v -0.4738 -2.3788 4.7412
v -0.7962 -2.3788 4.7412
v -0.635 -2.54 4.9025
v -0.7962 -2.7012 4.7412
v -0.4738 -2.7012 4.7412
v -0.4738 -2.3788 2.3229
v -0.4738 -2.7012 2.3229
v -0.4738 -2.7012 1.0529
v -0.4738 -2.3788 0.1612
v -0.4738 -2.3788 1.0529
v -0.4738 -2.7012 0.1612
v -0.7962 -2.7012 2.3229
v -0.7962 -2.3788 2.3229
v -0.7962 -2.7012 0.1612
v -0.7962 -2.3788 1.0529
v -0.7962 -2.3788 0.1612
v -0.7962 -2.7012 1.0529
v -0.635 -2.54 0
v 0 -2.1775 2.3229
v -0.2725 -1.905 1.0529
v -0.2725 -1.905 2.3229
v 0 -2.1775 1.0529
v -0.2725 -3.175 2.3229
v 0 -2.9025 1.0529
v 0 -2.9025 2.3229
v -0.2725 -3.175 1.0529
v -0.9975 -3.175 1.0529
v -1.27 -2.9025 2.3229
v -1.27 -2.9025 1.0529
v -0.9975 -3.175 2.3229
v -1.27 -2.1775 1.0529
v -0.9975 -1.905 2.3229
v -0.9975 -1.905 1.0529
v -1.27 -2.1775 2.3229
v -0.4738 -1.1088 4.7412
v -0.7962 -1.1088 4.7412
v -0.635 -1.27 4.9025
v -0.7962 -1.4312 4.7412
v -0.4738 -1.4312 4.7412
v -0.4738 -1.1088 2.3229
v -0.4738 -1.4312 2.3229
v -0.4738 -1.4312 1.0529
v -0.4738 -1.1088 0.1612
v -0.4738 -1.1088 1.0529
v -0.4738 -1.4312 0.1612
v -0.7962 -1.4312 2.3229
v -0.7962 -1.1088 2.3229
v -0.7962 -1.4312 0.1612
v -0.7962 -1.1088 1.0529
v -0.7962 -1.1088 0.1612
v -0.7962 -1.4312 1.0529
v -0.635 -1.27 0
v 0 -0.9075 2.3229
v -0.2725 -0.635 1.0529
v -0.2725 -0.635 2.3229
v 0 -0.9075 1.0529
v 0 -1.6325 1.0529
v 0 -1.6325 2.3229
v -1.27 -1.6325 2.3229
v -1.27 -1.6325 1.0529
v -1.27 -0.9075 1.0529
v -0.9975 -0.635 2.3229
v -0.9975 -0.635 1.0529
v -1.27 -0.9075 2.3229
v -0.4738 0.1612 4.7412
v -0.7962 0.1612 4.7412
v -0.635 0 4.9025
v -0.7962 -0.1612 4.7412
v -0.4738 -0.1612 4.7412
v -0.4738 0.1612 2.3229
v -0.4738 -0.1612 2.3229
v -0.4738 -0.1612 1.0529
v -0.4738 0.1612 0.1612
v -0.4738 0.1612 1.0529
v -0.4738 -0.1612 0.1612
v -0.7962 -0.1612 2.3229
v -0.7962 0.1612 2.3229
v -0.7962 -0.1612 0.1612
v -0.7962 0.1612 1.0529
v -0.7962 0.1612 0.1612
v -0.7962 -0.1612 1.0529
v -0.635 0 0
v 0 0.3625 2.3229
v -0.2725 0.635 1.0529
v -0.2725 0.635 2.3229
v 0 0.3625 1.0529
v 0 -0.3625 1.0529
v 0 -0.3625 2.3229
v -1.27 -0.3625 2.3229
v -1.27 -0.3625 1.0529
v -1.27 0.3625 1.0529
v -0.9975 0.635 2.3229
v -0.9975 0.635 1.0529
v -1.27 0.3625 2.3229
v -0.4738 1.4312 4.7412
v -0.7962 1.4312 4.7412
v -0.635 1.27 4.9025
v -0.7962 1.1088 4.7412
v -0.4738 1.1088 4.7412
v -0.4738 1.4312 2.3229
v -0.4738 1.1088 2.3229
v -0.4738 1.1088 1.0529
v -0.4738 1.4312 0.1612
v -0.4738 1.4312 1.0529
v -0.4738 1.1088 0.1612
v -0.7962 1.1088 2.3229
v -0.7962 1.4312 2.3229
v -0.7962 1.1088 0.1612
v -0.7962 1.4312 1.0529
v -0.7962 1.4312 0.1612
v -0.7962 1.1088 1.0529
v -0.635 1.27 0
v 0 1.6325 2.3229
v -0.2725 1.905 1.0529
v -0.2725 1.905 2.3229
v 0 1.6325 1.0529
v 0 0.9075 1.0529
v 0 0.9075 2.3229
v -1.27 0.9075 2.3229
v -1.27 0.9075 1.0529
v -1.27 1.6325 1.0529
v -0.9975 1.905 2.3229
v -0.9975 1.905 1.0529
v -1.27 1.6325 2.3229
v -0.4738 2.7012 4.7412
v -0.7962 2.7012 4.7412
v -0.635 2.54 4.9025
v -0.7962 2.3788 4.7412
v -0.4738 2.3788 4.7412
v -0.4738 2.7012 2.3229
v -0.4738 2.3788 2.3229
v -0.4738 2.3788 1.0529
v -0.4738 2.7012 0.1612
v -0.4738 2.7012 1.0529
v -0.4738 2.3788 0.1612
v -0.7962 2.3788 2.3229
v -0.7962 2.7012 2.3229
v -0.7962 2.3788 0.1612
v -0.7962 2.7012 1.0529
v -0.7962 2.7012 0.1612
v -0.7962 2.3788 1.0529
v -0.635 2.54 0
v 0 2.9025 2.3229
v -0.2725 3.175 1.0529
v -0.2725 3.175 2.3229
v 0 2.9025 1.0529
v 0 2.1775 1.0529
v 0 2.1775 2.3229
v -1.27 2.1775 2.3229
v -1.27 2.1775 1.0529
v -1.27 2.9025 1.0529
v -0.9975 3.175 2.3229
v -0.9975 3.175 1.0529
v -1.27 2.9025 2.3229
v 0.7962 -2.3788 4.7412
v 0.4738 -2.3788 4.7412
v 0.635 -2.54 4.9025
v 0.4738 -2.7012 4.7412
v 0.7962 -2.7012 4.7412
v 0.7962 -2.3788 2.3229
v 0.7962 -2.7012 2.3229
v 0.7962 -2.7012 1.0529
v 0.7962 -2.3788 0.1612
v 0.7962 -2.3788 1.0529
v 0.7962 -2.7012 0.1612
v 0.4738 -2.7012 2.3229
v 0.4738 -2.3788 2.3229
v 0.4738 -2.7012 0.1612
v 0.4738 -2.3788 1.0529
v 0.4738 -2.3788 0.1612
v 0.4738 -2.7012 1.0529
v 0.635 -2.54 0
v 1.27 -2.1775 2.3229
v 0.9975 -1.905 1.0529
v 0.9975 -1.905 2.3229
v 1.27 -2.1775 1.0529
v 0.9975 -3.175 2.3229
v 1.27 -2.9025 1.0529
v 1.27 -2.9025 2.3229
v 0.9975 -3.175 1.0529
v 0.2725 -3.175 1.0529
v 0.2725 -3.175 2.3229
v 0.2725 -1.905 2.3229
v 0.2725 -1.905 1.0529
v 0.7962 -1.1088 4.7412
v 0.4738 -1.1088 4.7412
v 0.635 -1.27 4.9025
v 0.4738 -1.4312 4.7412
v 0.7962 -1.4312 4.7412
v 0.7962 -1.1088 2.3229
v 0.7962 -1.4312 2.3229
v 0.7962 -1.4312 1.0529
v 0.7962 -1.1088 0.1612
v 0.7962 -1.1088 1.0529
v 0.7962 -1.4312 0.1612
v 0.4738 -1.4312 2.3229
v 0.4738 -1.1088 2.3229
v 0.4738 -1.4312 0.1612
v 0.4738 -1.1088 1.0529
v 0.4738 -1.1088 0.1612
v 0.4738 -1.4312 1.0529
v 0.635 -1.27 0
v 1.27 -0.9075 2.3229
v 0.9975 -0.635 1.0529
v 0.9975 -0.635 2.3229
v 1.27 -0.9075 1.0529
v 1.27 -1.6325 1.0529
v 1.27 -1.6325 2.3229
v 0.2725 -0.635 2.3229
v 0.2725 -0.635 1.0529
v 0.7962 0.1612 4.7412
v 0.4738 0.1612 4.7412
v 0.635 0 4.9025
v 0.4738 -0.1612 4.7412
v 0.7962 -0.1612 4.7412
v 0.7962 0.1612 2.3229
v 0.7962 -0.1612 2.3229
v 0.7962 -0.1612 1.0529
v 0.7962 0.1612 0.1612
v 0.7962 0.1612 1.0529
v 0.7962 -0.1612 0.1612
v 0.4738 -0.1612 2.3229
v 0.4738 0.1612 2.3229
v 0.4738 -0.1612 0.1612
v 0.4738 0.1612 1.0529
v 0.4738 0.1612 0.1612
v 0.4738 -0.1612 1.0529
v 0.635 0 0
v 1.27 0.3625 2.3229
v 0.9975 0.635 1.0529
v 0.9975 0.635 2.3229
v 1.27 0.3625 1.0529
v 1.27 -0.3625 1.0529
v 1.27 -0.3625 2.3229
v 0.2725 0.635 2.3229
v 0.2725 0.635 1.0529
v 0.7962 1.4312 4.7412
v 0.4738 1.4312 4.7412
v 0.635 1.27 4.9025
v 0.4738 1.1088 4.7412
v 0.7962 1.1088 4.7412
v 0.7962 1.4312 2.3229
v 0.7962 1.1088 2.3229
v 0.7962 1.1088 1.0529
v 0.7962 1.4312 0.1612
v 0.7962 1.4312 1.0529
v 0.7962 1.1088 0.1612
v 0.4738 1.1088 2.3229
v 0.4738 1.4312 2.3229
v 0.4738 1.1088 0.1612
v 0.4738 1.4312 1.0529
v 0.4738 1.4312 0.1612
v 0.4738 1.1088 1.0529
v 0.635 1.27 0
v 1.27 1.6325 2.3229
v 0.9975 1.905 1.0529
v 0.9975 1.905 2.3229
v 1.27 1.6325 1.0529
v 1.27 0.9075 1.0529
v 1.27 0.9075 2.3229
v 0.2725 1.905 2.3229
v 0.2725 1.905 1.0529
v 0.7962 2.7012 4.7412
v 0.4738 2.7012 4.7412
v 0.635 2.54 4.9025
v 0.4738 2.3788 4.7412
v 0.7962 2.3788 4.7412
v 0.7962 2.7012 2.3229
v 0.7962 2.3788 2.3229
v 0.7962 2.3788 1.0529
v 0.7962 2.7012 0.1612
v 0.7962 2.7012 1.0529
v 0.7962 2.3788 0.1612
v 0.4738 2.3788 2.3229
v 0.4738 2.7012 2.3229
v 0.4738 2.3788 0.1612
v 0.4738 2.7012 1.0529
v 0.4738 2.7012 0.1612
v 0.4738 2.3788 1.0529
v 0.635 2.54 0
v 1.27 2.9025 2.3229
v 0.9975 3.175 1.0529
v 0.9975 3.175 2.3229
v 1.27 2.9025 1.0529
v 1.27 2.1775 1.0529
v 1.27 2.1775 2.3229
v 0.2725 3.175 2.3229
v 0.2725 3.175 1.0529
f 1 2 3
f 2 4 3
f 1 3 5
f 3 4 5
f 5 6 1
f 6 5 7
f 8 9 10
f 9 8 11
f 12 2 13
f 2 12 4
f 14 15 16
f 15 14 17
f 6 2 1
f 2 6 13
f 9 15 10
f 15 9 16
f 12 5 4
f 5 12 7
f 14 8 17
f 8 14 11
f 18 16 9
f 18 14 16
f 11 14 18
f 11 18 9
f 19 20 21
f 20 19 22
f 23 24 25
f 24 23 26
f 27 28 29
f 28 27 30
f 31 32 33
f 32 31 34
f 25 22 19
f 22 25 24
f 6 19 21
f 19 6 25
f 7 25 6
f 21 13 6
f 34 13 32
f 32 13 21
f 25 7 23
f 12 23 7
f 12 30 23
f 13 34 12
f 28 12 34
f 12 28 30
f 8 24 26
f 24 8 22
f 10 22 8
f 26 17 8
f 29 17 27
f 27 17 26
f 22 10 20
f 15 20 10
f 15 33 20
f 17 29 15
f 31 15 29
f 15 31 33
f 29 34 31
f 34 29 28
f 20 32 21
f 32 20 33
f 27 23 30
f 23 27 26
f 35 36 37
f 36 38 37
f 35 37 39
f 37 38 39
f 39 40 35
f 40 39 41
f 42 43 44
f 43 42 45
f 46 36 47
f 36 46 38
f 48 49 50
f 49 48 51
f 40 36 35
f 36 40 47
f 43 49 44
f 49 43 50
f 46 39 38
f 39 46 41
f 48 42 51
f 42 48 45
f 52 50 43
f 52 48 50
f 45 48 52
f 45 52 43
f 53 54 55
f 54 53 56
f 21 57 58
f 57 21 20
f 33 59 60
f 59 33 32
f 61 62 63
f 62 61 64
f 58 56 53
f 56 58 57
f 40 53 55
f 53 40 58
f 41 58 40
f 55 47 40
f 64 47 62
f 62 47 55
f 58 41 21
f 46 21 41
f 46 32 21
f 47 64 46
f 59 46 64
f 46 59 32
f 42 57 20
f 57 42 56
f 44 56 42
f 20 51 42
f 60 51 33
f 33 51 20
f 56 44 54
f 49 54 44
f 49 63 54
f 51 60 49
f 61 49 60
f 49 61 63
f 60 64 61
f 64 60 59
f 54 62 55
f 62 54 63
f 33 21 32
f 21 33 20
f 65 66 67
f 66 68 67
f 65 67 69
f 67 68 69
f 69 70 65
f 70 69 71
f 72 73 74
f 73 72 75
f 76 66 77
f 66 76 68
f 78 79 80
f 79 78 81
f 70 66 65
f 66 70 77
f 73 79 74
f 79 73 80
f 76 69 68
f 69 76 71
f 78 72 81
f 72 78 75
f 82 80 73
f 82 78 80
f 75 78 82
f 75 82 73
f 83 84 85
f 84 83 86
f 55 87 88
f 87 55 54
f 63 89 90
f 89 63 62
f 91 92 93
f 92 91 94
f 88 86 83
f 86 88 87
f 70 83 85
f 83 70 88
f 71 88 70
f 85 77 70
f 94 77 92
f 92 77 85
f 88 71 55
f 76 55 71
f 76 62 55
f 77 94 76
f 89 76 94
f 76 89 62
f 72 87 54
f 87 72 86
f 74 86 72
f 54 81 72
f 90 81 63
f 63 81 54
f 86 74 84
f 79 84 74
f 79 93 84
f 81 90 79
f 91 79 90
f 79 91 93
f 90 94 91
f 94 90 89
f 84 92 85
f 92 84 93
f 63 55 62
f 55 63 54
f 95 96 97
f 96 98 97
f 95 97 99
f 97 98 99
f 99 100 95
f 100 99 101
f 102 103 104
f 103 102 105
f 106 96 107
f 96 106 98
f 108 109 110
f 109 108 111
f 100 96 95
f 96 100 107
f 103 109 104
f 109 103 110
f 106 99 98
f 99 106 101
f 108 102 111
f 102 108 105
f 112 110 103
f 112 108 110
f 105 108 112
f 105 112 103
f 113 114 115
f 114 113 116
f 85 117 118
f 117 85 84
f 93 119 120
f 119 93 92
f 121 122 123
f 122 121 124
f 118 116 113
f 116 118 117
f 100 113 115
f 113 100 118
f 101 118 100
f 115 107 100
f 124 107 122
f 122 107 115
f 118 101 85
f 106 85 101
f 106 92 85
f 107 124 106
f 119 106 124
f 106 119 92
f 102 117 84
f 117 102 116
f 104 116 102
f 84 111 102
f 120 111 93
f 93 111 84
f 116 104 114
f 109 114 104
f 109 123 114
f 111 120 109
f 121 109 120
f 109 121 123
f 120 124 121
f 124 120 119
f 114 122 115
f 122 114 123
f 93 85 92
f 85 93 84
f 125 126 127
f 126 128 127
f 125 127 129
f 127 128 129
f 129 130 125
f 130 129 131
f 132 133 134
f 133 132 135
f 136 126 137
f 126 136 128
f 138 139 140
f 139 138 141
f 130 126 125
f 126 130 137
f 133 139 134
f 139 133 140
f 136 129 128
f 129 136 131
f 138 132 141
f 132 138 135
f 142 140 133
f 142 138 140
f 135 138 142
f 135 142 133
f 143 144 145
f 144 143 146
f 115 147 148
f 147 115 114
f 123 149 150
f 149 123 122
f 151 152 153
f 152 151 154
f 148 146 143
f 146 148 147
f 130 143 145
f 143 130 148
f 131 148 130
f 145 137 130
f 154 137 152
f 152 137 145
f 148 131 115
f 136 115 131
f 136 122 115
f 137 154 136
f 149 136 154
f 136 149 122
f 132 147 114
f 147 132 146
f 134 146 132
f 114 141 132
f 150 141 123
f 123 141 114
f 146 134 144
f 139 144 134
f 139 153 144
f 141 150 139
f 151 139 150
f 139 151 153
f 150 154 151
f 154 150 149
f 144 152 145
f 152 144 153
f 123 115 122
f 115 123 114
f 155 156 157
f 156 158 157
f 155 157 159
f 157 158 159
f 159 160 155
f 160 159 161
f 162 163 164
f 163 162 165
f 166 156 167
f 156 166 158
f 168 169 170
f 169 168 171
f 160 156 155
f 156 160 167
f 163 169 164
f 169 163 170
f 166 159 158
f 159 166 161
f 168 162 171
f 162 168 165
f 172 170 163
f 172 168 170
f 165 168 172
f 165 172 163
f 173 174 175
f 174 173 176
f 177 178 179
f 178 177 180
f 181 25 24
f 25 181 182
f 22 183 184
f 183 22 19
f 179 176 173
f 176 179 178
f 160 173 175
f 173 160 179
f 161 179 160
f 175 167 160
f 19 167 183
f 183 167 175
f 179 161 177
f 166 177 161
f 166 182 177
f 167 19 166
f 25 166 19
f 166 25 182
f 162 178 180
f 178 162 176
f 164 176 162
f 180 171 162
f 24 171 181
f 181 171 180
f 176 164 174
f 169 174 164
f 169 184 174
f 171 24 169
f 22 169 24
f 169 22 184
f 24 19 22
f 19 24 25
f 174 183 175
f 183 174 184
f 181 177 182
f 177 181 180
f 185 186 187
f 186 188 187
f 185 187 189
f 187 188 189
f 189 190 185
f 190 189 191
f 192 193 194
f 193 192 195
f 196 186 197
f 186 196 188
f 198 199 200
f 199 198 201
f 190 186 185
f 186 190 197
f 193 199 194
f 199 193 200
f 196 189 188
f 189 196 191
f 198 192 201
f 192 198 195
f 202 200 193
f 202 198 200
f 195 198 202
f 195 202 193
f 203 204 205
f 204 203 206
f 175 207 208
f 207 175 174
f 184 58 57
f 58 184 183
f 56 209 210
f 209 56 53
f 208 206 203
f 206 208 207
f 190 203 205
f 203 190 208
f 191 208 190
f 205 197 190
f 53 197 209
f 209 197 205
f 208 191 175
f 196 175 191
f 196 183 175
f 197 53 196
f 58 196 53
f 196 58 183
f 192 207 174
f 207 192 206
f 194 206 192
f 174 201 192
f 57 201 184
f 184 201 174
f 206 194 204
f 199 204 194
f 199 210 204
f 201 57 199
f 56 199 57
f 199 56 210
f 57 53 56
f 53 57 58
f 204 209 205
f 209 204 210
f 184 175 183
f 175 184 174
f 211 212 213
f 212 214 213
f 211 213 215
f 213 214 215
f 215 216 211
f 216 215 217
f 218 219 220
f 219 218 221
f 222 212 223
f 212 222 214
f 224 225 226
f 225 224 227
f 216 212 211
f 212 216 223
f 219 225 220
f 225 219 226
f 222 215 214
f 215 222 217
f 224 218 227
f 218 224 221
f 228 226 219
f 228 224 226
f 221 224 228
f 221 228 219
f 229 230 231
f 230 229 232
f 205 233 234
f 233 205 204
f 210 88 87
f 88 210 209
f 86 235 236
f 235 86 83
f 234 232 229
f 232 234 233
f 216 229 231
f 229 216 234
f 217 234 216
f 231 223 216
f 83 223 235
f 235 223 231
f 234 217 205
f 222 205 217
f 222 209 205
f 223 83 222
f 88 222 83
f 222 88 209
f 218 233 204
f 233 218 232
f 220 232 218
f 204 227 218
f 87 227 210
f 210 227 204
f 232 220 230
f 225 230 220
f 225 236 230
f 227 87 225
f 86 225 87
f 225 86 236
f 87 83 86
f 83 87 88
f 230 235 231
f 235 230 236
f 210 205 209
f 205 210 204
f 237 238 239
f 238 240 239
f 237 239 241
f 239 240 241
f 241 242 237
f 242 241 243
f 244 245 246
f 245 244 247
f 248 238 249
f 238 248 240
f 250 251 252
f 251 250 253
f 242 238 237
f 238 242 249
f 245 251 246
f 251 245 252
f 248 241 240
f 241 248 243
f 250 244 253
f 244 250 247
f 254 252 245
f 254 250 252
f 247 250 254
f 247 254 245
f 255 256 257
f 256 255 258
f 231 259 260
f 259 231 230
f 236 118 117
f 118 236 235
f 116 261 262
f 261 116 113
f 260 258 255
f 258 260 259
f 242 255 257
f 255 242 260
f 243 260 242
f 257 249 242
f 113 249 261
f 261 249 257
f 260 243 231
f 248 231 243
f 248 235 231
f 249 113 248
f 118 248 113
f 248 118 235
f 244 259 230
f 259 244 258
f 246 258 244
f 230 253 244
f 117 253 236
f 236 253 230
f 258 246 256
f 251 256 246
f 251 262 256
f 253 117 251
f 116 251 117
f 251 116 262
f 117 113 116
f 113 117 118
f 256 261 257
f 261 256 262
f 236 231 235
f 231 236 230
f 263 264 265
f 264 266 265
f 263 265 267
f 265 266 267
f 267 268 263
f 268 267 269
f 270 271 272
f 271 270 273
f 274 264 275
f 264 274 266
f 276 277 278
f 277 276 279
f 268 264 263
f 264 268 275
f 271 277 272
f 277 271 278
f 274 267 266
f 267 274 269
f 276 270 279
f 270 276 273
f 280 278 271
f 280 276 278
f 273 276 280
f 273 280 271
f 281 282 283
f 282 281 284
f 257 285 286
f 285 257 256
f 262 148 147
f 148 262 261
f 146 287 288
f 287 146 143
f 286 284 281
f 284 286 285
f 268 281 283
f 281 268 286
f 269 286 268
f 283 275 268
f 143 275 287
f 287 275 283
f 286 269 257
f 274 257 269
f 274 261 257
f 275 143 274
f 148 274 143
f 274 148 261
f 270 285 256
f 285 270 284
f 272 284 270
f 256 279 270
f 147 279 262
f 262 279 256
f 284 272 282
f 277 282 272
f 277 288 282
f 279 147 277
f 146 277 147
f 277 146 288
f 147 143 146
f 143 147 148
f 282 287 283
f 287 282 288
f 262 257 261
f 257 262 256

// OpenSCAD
//Number of rows of pins in the header
header_rows = 5; //[1,2,3,4,5,6,7,8,9,10]

//Number of columns of pins in the header
header_columns = 2; //[1,2,3]

//The header's pitch between any two pins
header_pitch = 1.27; //[1.27,2.54]

header(header_rows,header_columns,header_pitch);

module header(rows,cols,pitch){
    offsety=-1*((rows-1)/2*pitch);
    offsetx=-1*((cols-1)/2*pitch);
    translate([offsetx,offsety,0])
    union(){
        for(j=[0:1:cols-1]){
            translate([pitch*j,0,0])
            for(i=[0:1:rows-1]){
                translate([0,pitch*i,0])pin(pitch);
            }
        }
    }
}

module pin(p=2.54){
    s=p/4+0.005;
    h=p*4-0.5;
    base=h/3;
    d=s/2;
    union(){
        color("gold")union(){
            translate([0,0,h+d])rotate([0,0,45])
            cylinder($fn=4,r1=sqrt(2*pow(d,2)),r2=0,h=d,center=false);
            translate([-d,-d,d])cube([s,s,h],center=false);
            translate([0,0,d])rotate([0,0,45])mirror([0,0,d])
            cylinder($fn=4,r1=sqrt(2*pow(d,2)),r2=0,h=d,center=false);
        }
       color("Dimgray")difference(){
            translate([0,0,base+d])cube([p,p,p],center=true);
            union(){
                translate([1.9*s,1.9*s,base+d])rotate([0,0,45])cylinder($fn=3,r=2*d,h=p+1,center=true);
                translate([1.9*s,-1.9*s,base+d-0.15])rotate([0,0,-45])cylinder($fn=3,r=2*d,h=p+1,center=true);
                translate([-1.9*s,-1.9*s,base+d-0.3])rotate([0,0,180+45])cylinder($fn=3,r=2*d,h=p+1,center=true);
                translate([-1.9*s,1.9*s,base+d-0.3])rotate([0,0,180-45])cylinder($fn=3,r=2*d,h=p+1,center=true);
            }
        }
    }
}
